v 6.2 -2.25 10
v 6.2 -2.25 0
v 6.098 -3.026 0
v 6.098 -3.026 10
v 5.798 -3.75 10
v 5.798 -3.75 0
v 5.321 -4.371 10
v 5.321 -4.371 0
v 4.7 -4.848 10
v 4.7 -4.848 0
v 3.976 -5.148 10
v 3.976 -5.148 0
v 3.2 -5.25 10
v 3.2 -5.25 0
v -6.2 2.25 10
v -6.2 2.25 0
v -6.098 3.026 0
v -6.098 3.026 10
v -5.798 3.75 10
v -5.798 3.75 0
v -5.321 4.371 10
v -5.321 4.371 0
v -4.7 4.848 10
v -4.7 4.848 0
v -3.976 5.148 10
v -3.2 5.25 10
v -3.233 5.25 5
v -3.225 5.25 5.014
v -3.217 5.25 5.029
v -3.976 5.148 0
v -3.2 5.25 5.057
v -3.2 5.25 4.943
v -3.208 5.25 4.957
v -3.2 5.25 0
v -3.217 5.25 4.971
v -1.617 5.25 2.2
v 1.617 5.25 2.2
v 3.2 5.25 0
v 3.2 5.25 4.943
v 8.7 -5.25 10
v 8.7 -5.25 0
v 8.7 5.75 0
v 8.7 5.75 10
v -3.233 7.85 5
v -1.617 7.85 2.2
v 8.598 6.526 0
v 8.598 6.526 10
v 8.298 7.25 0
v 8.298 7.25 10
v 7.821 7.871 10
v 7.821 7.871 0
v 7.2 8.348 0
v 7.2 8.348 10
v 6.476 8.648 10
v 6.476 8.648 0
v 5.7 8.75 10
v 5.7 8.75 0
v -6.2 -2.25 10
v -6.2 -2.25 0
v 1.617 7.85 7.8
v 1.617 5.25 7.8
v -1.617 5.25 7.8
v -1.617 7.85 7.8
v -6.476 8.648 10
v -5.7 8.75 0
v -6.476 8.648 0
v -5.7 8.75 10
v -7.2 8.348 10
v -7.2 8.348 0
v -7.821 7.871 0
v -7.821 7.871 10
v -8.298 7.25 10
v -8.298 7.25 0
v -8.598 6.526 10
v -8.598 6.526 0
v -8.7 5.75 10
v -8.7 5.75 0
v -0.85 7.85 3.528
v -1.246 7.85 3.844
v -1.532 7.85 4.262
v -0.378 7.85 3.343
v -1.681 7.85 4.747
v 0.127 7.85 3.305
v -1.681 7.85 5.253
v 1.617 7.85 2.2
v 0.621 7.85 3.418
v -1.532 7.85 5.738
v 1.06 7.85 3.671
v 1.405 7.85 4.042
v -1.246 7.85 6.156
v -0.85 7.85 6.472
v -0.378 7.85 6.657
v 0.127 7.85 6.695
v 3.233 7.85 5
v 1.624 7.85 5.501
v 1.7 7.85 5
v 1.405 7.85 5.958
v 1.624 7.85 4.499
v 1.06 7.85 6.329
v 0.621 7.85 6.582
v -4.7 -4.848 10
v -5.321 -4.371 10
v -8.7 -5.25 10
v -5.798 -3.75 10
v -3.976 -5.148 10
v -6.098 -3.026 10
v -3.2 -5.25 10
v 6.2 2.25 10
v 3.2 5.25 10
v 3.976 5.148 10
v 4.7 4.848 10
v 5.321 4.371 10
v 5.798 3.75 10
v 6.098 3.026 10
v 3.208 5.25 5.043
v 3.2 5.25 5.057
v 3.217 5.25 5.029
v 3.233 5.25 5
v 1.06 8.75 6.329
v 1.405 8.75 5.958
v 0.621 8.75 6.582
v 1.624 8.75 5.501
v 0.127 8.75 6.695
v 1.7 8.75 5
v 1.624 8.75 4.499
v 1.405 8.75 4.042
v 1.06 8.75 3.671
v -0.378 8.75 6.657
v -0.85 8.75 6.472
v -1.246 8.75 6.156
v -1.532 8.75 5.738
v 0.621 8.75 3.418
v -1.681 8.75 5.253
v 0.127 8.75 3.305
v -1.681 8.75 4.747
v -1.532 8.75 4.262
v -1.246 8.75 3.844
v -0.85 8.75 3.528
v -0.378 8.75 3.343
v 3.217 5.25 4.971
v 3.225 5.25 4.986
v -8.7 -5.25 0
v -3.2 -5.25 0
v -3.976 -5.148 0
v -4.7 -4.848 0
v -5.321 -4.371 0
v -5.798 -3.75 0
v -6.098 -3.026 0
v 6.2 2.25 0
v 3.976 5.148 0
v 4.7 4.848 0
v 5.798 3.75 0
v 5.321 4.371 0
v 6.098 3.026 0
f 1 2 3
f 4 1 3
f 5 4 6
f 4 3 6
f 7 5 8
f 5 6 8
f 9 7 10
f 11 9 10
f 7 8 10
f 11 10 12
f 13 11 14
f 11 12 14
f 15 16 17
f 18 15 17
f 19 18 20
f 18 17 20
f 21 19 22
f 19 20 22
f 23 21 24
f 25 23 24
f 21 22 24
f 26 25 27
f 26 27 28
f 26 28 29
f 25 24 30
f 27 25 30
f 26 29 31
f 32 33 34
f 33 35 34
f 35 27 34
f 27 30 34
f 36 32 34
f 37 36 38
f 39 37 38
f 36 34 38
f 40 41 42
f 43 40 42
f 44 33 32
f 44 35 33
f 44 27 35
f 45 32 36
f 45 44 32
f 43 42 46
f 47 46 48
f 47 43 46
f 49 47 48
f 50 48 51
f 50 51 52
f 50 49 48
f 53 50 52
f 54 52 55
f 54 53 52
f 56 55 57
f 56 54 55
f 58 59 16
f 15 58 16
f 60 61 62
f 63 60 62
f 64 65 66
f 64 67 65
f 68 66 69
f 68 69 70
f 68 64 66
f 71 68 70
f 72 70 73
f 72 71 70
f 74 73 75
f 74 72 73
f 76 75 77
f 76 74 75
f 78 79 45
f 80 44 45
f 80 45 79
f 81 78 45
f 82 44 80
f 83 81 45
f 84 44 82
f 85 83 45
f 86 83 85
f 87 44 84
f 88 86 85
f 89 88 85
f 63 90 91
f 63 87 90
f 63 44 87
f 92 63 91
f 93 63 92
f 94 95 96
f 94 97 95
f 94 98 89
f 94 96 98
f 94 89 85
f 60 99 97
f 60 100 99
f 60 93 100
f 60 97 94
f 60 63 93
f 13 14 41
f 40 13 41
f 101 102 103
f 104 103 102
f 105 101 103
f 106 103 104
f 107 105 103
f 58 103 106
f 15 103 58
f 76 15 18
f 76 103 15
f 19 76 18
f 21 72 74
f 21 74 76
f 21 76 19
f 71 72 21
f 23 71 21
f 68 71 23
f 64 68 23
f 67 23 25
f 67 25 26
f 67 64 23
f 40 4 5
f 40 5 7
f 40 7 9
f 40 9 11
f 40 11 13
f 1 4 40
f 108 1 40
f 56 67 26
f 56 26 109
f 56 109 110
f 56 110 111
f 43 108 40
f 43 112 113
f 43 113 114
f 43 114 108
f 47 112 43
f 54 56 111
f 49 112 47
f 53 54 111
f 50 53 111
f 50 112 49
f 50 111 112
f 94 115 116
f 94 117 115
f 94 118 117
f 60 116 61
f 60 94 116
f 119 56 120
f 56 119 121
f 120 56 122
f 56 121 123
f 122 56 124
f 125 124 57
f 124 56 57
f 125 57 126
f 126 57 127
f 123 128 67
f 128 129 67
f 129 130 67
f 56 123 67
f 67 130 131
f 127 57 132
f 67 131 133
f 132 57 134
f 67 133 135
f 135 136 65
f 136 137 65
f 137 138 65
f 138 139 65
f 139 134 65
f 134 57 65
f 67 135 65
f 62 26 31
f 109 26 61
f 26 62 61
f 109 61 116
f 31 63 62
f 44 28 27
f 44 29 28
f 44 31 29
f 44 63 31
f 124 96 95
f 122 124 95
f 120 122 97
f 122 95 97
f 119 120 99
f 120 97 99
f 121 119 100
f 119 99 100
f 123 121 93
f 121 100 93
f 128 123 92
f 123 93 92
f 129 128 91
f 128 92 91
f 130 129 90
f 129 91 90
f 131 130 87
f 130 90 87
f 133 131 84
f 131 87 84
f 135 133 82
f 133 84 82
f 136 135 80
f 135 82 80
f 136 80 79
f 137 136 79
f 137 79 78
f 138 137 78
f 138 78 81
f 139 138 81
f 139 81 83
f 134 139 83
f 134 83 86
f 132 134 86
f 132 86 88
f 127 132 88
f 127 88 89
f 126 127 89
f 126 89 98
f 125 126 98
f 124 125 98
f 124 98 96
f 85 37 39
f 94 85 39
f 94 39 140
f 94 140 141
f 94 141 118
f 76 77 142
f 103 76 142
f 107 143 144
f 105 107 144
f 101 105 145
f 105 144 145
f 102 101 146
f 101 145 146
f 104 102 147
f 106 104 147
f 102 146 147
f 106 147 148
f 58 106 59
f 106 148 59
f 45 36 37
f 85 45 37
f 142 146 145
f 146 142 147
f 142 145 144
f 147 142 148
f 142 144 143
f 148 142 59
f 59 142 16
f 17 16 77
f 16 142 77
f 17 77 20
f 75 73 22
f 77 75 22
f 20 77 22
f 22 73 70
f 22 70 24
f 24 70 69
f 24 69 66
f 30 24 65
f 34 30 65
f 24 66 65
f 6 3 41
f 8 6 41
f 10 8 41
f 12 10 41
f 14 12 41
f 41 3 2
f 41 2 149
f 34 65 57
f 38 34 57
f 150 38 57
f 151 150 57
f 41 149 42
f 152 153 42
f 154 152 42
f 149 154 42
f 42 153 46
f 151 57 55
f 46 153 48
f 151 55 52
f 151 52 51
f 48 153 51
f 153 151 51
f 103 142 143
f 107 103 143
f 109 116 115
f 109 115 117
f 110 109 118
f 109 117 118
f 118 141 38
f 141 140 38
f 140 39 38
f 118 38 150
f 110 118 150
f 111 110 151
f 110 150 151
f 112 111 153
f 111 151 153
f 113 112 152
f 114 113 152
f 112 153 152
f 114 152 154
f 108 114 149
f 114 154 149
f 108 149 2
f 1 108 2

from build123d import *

# Parameters (mm, degrees)
RESSALTO_EXTRUS_O1_DEPTH   = 10
CORTE_EXTRUS_O1_DEPTH      = 2
CORTE_EXTRUS_O1_DEPTH_BACK = 2.6
ESBO_O3_R                  = 1.7
CORTE_EXTRUS_O2_DEPTH      = 1.9
FILETE2_R                  = 3


with BuildPart() as part:
    # Esboço1 → Ressalto-extrusão1 (new body)
    with BuildSketch(Plane.XY):
        with BuildLine():
            Line((3.2, -5.25), (8.7, -5.25))
            Line((8.7, -5.25), (8.7, 8.75))
            Line((8.7, 8.75), (-8.7, 8.75))
            Line((-8.7, 8.75), (-8.7, -5.25))
            Line((-8.7, -5.25), (-3.2, -5.25))
            ThreePointArc((-3.2, -5.25), (-5.321320344, -4.371320344), (-6.2, -2.25))
            Line((-6.2, -2.25), (-6.2, 2.25))
            ThreePointArc((-6.2, 2.25), (-5.321320344, 4.371320344), (-3.2, 5.25))
            Line((-3.2, 5.25), (3.2, 5.25))
            ThreePointArc((3.2, 5.25), (5.321320344, 4.371320344), (6.2, 2.25))
            Line((6.2, 2.25), (6.2, -2.25))
            ThreePointArc((6.2, -2.25), (5.321320344, -4.371320344), (3.2, -5.25))
        make_face()
    extrude(amount=RESSALTO_EXTRUS_O1_DEPTH)

    # Esboço2 → Corte-extrusão1 (cut, two sides)
    with BuildSketch(Plane.XZ.offset(-5.25)) as corte_extrus_o1_sk:
        Polygon((1.616580754, 2.2), (3.233161507, 5), (1.616580754, 7.8), (-1.616580754, 7.8), (-3.233161507, 5), (-1.616580754, 2.2), align=None)
    extrude(amount=CORTE_EXTRUS_O1_DEPTH, mode=Mode.SUBTRACT)
    extrude(corte_extrus_o1_sk.sketch, amount=-CORTE_EXTRUS_O1_DEPTH_BACK, mode=Mode.SUBTRACT)

    # Esboço3 → Corte-extrusão2 (cut, through all)
    with BuildSketch(Plane.XZ.offset(-7.85)):
        with Locations((0, 5)):
            Circle(ESBO_O3_R)
    extrude(amount=-CORTE_EXTRUS_O2_DEPTH, mode=Mode.SUBTRACT)

    # Filete2
    filete2_edges = [part.edges().sort_by_distance(p)[0] for p in [
        (-8.7, 8.75, 5),
        (8.7, 8.75, 5),
    ]]
    fillet(filete2_edges, radius=FILETE2_R)


solid = part.part
